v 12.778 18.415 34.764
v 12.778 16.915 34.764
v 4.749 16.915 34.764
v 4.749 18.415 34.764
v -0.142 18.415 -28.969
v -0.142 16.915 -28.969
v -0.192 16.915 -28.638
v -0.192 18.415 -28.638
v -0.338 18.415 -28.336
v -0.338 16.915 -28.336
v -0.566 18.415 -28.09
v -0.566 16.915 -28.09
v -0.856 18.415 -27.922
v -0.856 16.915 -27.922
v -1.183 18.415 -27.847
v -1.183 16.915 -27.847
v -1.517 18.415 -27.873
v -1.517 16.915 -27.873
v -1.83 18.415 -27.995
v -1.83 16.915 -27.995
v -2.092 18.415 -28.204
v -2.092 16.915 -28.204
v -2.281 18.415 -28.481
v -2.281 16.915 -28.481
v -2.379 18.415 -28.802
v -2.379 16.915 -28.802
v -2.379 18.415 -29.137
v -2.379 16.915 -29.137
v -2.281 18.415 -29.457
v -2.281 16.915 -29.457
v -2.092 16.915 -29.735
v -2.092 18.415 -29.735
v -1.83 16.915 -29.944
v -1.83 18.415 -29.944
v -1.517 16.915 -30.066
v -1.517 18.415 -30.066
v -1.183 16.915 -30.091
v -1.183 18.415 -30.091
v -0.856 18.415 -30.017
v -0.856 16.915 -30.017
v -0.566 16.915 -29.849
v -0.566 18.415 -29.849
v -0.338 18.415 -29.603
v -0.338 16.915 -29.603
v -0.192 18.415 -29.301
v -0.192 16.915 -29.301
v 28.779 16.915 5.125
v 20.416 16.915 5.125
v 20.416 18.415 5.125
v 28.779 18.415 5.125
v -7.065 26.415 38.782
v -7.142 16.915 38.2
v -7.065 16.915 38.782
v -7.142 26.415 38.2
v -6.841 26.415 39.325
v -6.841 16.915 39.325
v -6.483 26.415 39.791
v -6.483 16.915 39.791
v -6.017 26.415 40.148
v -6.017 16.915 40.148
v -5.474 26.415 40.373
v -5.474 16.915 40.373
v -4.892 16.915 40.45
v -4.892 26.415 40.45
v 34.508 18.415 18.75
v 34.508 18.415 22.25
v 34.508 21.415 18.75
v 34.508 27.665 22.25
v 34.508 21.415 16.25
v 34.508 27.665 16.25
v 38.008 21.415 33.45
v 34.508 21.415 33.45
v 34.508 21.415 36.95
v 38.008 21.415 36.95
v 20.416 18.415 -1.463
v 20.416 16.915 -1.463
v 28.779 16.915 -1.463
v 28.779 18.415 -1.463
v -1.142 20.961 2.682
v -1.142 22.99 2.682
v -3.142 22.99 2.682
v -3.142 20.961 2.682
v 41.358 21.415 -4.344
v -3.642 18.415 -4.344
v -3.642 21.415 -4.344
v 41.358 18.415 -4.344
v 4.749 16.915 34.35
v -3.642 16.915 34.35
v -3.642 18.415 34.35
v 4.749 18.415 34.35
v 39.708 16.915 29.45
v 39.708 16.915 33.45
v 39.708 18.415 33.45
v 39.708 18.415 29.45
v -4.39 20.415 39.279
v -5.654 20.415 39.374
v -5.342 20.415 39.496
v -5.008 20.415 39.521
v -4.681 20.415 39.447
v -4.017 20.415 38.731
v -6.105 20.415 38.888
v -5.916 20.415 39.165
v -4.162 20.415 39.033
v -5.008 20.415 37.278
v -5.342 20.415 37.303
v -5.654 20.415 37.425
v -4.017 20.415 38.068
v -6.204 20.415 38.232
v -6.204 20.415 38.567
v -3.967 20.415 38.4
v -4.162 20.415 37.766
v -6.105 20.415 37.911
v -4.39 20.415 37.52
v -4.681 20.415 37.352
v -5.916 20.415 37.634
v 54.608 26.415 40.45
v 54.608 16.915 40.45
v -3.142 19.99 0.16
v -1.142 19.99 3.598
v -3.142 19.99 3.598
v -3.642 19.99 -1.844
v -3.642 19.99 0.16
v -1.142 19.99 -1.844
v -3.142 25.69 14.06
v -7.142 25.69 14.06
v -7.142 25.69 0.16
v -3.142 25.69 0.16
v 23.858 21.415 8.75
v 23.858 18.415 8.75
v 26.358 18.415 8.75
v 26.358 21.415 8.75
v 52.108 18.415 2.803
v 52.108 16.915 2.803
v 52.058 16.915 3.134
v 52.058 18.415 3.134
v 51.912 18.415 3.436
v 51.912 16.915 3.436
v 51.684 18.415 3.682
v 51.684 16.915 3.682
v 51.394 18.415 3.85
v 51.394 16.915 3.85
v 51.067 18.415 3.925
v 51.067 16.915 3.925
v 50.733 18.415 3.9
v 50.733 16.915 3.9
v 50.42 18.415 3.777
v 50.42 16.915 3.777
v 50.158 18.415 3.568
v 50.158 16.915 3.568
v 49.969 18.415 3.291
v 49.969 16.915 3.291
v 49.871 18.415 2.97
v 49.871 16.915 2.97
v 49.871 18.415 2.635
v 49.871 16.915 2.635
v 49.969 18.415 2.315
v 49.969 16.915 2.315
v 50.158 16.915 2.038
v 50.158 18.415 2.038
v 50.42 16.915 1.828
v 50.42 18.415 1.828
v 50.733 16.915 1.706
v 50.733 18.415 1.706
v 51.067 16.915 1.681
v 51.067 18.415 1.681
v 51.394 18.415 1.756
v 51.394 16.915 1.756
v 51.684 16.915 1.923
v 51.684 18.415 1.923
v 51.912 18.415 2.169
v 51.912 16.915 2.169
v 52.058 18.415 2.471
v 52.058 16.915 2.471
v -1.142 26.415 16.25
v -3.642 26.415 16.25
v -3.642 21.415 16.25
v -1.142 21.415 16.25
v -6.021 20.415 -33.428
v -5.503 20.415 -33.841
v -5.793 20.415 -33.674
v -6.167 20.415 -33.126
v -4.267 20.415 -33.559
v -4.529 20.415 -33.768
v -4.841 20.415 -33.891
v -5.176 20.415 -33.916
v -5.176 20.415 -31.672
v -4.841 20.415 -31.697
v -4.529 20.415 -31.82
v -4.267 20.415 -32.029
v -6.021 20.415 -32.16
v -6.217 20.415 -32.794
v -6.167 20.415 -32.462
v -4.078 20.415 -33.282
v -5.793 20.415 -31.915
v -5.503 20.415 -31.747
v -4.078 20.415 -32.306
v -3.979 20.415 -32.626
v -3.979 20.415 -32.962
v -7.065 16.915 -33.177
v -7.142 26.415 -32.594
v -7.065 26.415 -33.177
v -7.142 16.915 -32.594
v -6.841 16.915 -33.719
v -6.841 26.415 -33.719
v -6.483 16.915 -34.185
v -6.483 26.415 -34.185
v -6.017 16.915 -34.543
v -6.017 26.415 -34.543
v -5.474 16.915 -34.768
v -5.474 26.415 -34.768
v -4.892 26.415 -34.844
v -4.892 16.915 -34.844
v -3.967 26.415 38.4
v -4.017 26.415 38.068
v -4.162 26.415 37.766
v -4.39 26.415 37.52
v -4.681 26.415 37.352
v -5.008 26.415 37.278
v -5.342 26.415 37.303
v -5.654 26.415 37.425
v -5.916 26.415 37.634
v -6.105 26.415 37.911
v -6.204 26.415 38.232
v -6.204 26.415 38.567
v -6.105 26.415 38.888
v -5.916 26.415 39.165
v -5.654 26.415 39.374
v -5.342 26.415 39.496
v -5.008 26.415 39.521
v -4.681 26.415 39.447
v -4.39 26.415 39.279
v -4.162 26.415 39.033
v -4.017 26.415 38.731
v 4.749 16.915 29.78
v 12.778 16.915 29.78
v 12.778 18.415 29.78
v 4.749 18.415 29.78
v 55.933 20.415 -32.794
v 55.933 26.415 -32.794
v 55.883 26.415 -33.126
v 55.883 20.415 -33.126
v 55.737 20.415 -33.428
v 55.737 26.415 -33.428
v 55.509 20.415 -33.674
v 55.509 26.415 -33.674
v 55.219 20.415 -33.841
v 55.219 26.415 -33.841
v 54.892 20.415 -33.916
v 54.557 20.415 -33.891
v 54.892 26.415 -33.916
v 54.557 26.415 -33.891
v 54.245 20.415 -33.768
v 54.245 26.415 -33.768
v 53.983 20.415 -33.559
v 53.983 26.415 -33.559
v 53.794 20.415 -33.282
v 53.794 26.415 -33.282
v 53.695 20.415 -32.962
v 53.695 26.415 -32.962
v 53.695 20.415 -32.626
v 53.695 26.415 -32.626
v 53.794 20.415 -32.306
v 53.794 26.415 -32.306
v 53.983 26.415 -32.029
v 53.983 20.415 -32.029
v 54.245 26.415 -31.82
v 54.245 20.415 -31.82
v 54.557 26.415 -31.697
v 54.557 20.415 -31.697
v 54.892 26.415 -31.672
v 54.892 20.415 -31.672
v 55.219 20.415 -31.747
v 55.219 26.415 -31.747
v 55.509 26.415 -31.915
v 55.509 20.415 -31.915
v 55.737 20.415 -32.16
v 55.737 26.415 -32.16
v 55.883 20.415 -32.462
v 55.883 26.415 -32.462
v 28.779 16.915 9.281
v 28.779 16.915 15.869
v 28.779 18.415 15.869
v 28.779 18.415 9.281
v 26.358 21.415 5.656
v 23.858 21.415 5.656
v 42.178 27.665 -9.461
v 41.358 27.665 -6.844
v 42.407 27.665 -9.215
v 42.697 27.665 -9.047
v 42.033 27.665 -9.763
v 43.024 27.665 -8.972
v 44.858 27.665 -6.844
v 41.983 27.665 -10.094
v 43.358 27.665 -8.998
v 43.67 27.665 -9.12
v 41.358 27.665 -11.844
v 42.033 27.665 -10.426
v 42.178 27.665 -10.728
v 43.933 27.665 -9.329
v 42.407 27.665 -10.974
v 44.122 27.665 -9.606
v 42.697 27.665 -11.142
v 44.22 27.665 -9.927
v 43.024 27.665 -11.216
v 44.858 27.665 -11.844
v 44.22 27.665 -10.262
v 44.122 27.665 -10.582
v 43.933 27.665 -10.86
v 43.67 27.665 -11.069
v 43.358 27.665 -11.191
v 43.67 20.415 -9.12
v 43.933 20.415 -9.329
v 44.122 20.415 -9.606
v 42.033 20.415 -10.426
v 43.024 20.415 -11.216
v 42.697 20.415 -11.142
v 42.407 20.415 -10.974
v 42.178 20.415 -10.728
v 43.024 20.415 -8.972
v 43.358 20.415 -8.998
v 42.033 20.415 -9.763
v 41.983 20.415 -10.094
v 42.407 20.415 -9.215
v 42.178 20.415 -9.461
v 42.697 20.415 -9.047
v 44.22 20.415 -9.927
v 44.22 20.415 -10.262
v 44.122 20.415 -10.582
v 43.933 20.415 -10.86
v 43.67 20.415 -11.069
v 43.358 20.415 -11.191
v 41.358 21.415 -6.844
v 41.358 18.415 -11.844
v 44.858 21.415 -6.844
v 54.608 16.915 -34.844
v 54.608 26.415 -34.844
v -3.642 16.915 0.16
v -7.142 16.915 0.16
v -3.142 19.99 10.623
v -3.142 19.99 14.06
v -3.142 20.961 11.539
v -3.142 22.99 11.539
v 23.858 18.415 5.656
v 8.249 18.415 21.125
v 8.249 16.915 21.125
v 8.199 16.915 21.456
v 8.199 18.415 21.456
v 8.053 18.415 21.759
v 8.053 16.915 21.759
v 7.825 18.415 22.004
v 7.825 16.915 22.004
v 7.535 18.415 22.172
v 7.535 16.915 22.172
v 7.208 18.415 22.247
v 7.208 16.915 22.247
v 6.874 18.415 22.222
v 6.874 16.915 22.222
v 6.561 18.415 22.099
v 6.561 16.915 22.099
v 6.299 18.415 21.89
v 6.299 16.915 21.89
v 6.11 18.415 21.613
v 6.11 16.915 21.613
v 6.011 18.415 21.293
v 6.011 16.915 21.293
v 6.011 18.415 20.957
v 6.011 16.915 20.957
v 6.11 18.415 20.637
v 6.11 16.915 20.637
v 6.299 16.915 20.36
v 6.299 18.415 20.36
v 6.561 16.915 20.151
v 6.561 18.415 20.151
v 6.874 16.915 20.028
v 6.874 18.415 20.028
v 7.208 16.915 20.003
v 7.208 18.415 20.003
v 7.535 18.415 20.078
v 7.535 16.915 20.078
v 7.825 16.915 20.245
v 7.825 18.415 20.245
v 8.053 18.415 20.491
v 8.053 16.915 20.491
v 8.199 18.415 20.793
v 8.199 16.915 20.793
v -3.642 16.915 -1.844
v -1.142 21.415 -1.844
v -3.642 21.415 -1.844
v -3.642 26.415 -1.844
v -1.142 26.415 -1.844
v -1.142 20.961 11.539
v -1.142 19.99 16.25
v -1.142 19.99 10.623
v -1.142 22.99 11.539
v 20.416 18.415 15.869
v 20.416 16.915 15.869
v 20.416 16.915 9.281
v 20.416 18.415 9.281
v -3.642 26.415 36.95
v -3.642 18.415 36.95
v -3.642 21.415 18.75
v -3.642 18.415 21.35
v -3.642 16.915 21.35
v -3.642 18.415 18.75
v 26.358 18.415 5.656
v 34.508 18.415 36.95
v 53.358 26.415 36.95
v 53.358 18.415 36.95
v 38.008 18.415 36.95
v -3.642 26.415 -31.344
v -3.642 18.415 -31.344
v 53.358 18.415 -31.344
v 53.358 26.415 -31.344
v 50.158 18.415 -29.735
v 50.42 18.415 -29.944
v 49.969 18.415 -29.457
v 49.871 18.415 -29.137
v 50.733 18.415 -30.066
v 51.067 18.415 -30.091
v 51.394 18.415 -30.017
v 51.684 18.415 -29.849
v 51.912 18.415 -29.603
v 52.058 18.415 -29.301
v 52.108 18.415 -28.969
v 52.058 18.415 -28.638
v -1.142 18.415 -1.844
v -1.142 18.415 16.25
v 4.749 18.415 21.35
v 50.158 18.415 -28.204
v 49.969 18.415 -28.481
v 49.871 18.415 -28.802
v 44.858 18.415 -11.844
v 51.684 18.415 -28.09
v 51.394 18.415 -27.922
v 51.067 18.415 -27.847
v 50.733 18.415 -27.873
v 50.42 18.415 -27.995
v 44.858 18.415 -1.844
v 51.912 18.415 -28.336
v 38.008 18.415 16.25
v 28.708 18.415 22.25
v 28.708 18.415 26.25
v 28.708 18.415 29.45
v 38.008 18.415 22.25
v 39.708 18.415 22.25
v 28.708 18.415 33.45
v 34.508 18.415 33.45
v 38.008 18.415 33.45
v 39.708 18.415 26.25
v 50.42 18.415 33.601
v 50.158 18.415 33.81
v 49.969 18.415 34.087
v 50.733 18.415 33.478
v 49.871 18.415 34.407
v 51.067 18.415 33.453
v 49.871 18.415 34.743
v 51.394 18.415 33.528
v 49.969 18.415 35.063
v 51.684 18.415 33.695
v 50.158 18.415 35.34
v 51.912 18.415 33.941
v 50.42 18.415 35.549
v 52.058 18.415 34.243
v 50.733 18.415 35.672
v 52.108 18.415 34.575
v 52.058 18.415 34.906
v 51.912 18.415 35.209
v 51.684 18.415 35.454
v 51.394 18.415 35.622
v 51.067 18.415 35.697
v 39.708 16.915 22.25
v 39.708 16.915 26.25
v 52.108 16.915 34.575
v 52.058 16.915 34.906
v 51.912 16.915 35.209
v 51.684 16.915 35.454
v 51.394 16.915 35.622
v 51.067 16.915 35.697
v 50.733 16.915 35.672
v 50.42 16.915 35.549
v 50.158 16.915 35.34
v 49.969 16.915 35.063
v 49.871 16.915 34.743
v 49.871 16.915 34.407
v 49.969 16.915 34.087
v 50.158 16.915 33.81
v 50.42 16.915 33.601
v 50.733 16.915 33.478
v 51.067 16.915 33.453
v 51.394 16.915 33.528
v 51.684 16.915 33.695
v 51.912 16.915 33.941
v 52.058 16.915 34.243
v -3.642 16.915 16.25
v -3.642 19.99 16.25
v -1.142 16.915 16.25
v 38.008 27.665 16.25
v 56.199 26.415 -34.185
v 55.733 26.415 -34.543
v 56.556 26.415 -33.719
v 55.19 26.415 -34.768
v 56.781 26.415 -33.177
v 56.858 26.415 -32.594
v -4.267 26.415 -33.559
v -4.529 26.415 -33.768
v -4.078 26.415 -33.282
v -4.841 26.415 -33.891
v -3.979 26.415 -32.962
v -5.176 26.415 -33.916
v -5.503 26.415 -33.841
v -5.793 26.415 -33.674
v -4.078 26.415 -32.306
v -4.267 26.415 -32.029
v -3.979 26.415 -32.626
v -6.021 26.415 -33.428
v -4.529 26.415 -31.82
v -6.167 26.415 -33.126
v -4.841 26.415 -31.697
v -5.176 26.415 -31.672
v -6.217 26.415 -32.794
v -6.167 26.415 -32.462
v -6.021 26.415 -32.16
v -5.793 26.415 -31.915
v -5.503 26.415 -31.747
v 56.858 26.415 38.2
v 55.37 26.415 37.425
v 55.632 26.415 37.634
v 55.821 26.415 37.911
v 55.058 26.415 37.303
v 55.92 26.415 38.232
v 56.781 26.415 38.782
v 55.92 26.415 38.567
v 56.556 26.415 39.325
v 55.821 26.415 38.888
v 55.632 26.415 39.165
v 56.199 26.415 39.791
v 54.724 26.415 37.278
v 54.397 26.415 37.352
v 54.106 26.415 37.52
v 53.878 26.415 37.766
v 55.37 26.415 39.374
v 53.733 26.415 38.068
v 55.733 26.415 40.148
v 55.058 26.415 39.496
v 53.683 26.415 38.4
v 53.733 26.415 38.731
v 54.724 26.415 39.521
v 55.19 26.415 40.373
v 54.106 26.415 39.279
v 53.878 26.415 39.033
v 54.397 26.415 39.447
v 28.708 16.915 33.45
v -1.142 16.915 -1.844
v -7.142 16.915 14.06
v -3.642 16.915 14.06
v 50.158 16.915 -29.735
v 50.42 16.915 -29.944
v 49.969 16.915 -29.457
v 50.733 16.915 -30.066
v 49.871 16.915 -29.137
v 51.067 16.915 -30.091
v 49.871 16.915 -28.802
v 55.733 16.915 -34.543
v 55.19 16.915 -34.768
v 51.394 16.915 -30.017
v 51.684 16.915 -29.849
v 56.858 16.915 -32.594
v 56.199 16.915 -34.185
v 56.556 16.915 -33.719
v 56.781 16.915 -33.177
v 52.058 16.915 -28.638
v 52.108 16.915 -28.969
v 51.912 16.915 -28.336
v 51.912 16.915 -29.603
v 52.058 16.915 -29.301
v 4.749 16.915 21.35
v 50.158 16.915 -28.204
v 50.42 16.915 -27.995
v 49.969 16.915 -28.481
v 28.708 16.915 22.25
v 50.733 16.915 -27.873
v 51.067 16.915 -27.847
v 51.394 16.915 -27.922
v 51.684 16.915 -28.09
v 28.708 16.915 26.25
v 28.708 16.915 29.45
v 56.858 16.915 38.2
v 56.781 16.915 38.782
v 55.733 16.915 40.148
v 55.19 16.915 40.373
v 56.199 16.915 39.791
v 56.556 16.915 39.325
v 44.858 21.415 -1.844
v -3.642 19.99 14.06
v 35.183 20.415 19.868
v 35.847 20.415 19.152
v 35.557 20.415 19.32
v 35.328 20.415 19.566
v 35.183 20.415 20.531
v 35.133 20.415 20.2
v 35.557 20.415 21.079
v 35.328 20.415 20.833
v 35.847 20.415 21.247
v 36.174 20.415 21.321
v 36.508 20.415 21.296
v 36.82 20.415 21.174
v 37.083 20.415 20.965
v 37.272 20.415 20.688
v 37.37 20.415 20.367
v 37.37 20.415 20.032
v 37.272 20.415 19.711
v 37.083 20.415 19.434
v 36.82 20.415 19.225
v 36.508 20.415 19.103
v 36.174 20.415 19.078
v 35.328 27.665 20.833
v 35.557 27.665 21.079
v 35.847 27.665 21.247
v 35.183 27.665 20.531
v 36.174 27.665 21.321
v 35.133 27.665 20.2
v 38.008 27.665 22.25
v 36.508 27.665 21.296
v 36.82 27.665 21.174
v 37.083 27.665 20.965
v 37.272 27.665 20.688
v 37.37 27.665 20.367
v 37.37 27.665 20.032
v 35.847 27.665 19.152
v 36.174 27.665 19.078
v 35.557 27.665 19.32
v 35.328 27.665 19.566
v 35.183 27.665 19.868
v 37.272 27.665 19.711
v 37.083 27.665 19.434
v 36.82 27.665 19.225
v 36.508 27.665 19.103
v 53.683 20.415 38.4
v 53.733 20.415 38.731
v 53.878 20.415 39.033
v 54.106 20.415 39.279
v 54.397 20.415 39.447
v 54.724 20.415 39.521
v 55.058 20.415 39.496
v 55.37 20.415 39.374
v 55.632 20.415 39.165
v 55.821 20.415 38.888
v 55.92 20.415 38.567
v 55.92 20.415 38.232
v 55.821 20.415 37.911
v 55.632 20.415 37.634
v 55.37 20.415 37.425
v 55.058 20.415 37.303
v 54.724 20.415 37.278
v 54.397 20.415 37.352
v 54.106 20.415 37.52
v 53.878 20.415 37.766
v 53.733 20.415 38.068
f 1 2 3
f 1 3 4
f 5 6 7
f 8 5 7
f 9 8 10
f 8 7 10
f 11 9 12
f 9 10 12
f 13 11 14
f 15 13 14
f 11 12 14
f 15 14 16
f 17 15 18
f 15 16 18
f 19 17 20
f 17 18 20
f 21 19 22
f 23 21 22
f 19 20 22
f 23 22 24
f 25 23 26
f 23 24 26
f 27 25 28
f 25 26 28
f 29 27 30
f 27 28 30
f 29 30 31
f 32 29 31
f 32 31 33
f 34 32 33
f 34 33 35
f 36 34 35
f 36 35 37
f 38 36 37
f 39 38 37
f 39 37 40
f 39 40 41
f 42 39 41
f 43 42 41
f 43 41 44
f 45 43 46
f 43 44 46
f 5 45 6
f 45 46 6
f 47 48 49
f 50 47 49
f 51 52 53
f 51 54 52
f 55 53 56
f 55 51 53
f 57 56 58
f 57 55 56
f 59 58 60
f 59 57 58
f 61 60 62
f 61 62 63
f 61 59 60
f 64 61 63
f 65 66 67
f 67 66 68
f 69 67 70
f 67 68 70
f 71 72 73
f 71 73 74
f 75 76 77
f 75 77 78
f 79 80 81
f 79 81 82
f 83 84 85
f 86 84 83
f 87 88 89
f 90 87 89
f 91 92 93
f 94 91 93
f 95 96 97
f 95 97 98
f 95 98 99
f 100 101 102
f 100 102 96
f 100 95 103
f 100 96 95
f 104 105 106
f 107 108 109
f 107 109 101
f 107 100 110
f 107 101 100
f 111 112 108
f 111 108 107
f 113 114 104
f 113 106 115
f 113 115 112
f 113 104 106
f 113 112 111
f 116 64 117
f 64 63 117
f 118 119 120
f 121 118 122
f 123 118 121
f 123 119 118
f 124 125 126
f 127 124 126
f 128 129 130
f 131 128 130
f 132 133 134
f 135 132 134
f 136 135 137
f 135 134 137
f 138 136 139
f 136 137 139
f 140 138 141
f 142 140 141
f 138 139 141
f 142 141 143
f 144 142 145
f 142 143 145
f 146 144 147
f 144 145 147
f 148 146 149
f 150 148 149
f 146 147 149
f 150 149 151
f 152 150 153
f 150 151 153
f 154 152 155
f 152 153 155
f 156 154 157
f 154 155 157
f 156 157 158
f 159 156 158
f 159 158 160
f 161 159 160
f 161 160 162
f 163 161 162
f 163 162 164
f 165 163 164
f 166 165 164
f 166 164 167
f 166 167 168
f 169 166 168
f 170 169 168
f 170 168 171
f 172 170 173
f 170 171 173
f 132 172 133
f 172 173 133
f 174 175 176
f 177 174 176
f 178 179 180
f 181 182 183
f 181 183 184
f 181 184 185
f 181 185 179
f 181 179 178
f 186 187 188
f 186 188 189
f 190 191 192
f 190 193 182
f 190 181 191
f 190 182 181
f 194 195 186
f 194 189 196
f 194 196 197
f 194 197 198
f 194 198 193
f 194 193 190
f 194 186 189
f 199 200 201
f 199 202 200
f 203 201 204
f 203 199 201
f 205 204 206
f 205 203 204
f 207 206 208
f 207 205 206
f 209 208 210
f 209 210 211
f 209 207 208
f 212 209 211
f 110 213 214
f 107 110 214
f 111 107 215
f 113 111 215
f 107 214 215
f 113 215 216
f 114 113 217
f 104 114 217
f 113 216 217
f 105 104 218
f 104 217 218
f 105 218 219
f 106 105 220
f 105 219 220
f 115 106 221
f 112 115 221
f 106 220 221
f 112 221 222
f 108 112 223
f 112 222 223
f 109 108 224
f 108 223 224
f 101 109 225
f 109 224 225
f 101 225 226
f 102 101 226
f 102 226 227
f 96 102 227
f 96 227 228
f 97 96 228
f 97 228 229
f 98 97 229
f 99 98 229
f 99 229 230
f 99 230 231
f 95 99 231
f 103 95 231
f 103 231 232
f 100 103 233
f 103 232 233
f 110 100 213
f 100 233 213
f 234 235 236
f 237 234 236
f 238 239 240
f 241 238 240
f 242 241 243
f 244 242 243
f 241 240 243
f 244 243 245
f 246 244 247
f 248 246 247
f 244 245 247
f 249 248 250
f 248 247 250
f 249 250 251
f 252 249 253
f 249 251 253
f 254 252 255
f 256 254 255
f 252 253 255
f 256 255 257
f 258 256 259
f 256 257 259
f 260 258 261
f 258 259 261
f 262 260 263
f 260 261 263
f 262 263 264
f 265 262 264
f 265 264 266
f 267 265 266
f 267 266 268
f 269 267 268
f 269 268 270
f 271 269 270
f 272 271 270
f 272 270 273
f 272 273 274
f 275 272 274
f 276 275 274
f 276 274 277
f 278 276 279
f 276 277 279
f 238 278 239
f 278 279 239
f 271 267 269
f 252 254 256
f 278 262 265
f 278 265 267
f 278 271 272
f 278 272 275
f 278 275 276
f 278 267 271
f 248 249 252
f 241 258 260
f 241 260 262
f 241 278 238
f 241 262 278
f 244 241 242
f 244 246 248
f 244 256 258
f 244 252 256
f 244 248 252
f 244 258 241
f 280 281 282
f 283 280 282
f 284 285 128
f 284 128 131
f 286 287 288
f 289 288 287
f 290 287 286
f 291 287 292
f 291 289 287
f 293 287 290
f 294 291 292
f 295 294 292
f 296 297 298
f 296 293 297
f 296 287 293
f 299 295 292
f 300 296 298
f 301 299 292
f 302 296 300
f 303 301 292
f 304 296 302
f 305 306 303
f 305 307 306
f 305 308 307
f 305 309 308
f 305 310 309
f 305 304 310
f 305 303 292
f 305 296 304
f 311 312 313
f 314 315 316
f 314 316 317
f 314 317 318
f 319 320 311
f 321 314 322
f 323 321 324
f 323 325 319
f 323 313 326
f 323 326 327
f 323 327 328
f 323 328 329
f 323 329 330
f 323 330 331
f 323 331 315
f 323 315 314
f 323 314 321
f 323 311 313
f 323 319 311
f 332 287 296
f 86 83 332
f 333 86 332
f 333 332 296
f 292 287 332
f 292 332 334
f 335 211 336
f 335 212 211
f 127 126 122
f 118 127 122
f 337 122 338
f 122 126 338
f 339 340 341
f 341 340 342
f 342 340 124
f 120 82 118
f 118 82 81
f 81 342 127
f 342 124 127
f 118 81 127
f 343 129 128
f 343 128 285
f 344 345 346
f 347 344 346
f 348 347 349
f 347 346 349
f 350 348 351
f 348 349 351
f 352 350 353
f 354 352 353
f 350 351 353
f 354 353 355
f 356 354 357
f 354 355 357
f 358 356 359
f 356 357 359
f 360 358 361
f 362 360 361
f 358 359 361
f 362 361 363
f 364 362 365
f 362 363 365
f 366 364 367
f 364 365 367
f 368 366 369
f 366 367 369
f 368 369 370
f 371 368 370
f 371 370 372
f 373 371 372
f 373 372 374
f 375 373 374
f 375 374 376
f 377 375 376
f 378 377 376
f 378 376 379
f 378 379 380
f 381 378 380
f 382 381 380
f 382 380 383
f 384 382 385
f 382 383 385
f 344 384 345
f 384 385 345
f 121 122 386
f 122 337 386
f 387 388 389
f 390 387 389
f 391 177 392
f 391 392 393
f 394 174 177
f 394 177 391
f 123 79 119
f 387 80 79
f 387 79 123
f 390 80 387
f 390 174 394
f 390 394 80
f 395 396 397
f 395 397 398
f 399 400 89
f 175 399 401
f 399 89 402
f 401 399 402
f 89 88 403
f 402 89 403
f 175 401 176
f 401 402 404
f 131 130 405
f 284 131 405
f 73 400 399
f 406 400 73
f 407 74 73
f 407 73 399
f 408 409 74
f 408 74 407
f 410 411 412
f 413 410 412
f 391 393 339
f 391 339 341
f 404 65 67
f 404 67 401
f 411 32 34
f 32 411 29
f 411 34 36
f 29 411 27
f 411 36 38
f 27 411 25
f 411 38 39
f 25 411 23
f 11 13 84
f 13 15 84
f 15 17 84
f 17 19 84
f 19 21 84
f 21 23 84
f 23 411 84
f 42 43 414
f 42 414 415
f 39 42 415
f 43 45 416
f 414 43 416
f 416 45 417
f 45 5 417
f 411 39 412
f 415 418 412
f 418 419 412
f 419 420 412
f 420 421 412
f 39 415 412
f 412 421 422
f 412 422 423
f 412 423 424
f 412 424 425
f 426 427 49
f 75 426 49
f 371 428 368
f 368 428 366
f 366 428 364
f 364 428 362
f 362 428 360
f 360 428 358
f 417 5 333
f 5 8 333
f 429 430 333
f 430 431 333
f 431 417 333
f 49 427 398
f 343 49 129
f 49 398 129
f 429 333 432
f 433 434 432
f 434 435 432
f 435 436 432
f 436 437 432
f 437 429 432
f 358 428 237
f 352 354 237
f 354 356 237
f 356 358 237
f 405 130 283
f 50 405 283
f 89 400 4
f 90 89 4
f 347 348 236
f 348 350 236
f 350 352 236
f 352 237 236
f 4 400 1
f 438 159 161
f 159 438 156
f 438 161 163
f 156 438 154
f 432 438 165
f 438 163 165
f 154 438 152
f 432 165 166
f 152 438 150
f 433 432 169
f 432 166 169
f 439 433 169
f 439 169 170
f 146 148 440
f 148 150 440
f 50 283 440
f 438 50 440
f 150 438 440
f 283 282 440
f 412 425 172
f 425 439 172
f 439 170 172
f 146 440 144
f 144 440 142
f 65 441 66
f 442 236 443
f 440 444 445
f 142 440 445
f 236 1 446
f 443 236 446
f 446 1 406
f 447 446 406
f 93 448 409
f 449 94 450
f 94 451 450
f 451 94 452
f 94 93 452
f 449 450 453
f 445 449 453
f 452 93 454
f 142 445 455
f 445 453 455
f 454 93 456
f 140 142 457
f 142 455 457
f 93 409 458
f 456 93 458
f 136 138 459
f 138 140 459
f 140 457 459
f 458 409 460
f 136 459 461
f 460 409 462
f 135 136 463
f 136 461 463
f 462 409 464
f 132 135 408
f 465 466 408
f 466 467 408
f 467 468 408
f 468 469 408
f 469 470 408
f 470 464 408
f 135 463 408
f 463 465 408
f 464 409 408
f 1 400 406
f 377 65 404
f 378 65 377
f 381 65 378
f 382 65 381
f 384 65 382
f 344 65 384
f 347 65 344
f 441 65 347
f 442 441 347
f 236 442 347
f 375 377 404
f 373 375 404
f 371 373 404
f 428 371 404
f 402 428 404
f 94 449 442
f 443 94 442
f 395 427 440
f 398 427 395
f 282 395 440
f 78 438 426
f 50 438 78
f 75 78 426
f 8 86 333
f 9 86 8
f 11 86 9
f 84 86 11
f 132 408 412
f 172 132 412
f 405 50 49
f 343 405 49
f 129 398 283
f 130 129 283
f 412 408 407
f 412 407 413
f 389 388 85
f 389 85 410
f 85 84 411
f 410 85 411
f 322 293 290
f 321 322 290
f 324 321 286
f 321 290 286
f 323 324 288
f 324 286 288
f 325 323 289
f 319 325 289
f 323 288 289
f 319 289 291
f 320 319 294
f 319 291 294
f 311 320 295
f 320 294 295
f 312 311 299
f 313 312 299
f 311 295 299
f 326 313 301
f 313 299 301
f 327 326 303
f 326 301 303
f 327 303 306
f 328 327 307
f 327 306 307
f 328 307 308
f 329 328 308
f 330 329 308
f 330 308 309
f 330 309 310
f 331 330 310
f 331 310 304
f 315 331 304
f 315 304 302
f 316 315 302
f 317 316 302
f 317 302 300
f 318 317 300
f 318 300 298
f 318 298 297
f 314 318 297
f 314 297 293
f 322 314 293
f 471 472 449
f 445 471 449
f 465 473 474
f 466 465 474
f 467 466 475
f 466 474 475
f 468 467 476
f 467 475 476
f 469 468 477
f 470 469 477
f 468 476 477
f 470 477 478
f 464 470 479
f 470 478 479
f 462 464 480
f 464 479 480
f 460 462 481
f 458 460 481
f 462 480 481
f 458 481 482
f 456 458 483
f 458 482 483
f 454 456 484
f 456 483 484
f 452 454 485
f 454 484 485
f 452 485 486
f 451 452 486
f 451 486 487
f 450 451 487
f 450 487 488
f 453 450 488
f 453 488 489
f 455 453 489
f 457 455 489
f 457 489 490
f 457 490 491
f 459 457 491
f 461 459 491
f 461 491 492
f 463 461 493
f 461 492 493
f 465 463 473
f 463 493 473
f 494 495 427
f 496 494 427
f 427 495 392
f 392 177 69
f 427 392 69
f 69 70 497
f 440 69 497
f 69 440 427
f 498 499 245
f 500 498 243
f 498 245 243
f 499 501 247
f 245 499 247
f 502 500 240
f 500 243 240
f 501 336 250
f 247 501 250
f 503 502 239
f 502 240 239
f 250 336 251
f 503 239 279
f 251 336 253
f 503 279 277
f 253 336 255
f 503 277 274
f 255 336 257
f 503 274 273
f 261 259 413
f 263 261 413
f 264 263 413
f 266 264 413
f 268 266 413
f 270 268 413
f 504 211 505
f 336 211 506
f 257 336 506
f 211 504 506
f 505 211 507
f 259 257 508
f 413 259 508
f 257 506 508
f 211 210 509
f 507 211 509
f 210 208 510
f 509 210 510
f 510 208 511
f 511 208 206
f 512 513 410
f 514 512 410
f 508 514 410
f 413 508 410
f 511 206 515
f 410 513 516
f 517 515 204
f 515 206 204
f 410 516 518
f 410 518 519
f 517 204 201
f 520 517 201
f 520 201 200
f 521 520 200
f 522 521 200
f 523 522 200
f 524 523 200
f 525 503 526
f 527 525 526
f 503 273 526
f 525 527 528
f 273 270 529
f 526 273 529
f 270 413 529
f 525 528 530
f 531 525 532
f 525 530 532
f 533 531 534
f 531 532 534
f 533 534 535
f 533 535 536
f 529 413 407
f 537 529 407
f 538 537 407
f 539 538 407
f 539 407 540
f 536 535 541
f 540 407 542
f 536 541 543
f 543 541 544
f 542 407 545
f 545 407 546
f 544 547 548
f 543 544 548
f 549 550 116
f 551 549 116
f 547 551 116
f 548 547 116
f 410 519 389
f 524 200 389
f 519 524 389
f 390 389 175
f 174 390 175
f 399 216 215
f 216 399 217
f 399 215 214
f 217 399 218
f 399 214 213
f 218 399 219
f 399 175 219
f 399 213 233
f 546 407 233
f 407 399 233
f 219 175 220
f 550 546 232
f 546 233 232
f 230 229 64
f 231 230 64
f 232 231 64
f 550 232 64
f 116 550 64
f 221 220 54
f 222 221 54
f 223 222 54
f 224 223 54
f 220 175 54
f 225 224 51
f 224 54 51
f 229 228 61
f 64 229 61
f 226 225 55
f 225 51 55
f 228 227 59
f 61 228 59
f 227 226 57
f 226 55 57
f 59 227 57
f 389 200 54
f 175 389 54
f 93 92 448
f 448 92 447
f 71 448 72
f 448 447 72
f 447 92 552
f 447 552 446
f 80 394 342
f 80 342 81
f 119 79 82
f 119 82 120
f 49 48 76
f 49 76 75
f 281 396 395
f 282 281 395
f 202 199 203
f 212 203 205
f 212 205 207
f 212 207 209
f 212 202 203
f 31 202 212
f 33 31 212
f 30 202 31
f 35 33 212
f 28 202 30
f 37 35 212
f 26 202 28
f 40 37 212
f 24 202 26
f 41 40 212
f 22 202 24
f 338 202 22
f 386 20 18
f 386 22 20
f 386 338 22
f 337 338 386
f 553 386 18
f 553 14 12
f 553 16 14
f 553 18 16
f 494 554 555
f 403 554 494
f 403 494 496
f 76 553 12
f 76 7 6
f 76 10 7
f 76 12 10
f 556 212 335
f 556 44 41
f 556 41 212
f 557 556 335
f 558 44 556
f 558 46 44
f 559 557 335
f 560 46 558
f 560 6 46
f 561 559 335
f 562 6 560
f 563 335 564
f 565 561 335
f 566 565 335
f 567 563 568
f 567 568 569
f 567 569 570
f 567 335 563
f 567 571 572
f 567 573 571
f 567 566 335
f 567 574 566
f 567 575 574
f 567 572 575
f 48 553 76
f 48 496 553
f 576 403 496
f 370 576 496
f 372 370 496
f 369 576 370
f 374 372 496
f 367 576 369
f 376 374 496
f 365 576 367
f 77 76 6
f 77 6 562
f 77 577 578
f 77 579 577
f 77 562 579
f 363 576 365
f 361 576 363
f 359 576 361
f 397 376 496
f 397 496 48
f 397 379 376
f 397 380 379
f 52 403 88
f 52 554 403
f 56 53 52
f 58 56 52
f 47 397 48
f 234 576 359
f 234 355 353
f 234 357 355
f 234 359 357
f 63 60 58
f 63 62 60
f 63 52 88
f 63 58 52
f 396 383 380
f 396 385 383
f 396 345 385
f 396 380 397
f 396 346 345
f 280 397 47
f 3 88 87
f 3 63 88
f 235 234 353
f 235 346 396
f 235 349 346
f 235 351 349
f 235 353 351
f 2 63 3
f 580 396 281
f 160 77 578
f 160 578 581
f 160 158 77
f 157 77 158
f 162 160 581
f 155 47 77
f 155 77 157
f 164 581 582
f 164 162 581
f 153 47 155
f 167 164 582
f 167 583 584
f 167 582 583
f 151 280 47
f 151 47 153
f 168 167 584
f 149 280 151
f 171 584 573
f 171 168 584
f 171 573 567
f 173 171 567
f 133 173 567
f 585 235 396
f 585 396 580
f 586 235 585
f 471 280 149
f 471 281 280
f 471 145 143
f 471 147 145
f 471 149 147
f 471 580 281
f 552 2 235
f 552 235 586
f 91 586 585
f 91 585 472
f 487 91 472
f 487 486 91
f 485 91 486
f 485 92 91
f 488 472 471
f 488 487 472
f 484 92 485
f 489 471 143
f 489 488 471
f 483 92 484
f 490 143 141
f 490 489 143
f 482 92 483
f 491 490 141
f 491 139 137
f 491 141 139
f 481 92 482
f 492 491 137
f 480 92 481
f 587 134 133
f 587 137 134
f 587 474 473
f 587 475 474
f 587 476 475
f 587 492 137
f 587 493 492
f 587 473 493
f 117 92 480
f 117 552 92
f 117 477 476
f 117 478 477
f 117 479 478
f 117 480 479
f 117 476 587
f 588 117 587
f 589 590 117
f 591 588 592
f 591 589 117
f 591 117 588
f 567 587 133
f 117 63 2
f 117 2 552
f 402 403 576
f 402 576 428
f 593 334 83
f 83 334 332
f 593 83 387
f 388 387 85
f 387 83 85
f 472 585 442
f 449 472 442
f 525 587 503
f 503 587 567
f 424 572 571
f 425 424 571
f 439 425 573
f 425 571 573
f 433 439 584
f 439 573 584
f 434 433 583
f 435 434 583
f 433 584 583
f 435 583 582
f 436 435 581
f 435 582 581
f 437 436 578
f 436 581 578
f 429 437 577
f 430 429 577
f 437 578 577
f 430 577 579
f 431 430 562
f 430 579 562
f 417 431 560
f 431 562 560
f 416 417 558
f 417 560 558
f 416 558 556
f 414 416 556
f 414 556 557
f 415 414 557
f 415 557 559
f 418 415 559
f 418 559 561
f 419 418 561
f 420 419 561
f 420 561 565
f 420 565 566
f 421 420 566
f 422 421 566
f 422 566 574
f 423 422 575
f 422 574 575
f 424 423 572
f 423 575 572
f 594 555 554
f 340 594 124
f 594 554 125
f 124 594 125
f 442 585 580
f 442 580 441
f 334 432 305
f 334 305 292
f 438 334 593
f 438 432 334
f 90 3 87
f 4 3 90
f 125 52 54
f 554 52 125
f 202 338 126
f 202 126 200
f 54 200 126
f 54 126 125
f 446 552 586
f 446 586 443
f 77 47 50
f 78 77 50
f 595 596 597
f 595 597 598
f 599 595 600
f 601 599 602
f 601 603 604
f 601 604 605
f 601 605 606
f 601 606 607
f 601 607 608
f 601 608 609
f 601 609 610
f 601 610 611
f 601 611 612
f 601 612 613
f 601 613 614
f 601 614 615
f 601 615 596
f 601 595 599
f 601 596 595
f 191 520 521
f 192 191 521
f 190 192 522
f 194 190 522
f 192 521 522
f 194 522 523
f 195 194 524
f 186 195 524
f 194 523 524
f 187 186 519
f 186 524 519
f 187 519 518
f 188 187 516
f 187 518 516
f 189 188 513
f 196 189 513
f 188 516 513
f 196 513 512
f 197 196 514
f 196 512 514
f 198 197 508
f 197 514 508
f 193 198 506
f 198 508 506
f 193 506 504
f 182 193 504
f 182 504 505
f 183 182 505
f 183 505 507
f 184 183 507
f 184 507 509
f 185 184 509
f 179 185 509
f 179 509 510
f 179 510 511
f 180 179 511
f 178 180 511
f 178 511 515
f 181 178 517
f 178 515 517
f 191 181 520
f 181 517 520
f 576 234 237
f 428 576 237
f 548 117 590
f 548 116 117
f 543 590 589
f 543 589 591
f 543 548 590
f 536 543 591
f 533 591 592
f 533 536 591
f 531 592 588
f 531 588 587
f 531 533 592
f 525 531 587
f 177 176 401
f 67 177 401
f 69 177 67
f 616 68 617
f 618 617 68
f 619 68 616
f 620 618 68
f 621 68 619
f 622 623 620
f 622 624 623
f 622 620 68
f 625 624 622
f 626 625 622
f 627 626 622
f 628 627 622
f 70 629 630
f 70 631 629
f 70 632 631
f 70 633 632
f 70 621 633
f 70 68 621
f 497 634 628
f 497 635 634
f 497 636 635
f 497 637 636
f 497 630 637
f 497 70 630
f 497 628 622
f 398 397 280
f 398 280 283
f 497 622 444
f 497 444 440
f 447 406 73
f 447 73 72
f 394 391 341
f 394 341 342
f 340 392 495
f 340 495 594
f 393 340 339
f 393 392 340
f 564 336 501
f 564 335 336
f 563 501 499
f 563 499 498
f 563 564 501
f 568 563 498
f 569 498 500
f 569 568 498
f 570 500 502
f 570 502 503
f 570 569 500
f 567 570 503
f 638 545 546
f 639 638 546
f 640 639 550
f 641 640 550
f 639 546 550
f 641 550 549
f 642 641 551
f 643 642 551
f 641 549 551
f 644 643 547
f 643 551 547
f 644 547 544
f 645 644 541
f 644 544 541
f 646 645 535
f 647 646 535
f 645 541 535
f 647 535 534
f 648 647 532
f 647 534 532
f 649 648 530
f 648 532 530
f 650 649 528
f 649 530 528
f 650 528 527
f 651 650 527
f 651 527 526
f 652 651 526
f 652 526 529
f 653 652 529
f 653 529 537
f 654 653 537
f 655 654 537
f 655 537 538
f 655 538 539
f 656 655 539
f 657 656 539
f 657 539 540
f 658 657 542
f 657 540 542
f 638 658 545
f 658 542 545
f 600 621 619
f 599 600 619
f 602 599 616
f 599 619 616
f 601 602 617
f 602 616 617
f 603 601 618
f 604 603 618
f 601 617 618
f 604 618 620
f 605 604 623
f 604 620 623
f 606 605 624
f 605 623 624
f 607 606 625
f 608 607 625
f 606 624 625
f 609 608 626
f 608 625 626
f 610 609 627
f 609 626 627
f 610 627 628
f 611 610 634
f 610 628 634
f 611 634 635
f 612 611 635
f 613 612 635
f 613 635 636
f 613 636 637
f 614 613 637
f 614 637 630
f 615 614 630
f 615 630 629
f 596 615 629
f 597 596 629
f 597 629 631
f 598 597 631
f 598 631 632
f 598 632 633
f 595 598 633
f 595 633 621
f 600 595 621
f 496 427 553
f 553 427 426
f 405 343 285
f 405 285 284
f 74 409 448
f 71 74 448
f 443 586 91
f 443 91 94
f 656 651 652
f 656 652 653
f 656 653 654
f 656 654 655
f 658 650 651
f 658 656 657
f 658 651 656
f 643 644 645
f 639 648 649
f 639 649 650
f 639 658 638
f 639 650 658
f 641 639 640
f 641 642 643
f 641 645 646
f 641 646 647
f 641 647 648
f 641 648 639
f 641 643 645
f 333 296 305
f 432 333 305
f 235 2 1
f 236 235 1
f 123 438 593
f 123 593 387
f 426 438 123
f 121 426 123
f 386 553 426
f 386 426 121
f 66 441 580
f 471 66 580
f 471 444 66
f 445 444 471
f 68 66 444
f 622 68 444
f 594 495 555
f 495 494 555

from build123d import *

# Parameters (mm, degrees)
SKETCH2_W              = 64
SKETCH2_H              = 75.2942
BASE_DEPTH             = 1.5
SKETCH6_W              = 64
SKETCH6_H              = 75.2942
SKETCH6_W_2            = 57
SKETCH6_H_2            = 68.2942
OUTSIDE_WALLS_DEPTH    = 8
SKETCH3_W              = 44.5
SKETCH3_H              = 2.5
SKETCH3_W_2            = 37.65
DIVIDER_WALLS_DEPTH    = 3
USB_START              = 0.160298289
USB_HOLE_DEPTH         = 13.899833209
SKETCH10_W             = 3.5
SKETCH10_H             = 3.5
BATT_MT3608_STOP_DEPTH = 3
TP4056_START           = 18.414945084
TP4056_STOP_OUTLINE_W  = 2.5
TP4056_STOP_OUTLINE_H  = 3.0942
TP4056_STOP_DEPTH      = 3
WIRE_START             = 20.416440404
WIRE_HOLES_OUTLINE_W   = 1.5
WIRE_HOLES_OUTLINE_H   = 6.588
WIRE_HOLES_DEPTH       = 8.3622
WIRE_START_2           = -3.642059596
WIRE_HOLES_2_OUTLINE_W = 1.5
WIRE_HOLES_2_OUTLINE_H = 13
WIRE_HOLES_2_DEPTH     = 8.390953786
WIRE_START_3           = 28.707940404
WIRE_HOLES_3_OUTLINE_W = 1.5
WIRE_HOLES_3_OUTLINE_H = 4
WIRE_HOLES_3_DEPTH     = 11
WIRE_START_4           = 4.74889419
WIRE_HOLES_4_OUTLINE_W = 1.5
WIRE_HOLES_4_OUTLINE_H = 4.98430333
WIRE_HOLES_4_DEPTH     = 8.028885191
USB_HOOD_DEPTH         = 2.5
USB_BACKING_DEPTH      = 2
SKETCH19_W             = 2.5
SKETCH19_H             = 18.0942
CUT_EXTRUDE2_DEPTH     = 1.5
SKETCH16_R             = 1.125
SCREW_HOLES_DEPTH      = 6
FILLET1_R              = 2.25
BOSS_EXTRUDE3_START    = 6.25
SKETCH17_W             = 3.5
SKETCH17_H             = 6
SKETCH17_R             = 1.125
SKETCH17_H_2           = 5
BOSS_EXTRUDE3_DEPTH    = 6.25
SKETCH18_R             = 1.125
CUT_EXTRUDE1_DEPTH     = 1.5


# Read off the part's stored shape, not the designer's step: USB Hole, TP4056 Stop, Wire Holes
with BuildPart() as part:
    # Sketch2 → Base (new body)
    with BuildSketch(Plane.XZ.offset(-18.414945084)):
        with Locations((24.857940404, 2.802763775)):
            Rectangle(SKETCH2_W, SKETCH2_H)
    extrude(amount=BASE_DEPTH)

    # Sketch6 → Outside Walls (add)
    with BuildSketch(Plane(origin=(0, 18.414945084, 0), x_dir=(1, 0, 0), z_dir=(0, 1, 0))):
        with Locations((24.857940404, -2.802763775)):
            Rectangle(SKETCH6_W, SKETCH6_H)
        with Locations((24.857940404, -2.802763775)):
            Rectangle(SKETCH6_W_2, SKETCH6_H_2, mode=Mode.SUBTRACT)
    extrude(amount=OUTSIDE_WALLS_DEPTH)

    # Sketch3 → Divider Walls (add)
    with BuildSketch(Plane(origin=(0, 18.414945084, 0), x_dir=(1, 0, 0), z_dir=(0, 1, 0))):
        with Locations((18.607940404, 3.094336225)):
            Rectangle(SKETCH3_W, SKETCH3_H)
        with Locations((15.182940404, -17.499863775)):
            Rectangle(SKETCH3_W_2, SKETCH3_H)
    extrude(amount=DIVIDER_WALLS_DEPTH)

    # USB Hole outline → USB Hole (cut)
    with BuildSketch(Plane.XY.offset(USB_START)):
        Polygon((-3.142059596, 16.914945084), (-3.142059596, 18.414945084), (-3.642059596, 18.414945084), (-3.642059596, 25.689688961), (-7.142059596, 25.689688961), (-7.142059596, 16.914945084), align=None)
    extrude(amount=USB_HOLE_DEPTH, mode=Mode.SUBTRACT)

    # Sketch10 → Batt & MT3608 Stop (add)
    with BuildSketch(Plane(origin=(0, 18.414945084, 0), x_dir=(1, 0, 0), z_dir=(0, 1, 0))):
        Polygon((44.857940404, 1.844336225), (40.857940404, 1.844336225), (40.857940404, 4.344336225), (41.357940404, 4.344336225), (41.357940404, 11.844336225), (44.857940404, 11.844336225), align=None)
        Polygon((34.507940404, -18.749863775), (34.007940404, -18.749863775), (34.007940404, -16.249863775), (38.007940404, -16.249863775), (38.007940404, -22.249863775), (34.507940404, -22.249863775), align=None)
        with Locations((36.257940404, -35.199863775)):
            Rectangle(SKETCH10_W, SKETCH10_H)
    extrude(amount=BATT_MT3608_STOP_DEPTH)

    # TP4056 Stop outline → TP4056 Stop (add)
    with BuildSketch(Plane(origin=(0, 0, 0), x_dir=(1, 0, 0), z_dir=(0, 1, 0)).offset(TP4056_START)):
        with Locations((25.107940404, -7.202763775)):
            Rectangle(TP4056_STOP_OUTLINE_W, TP4056_STOP_OUTLINE_H)
    extrude(amount=TP4056_STOP_DEPTH)

    # Wire Holes outline → Wire Holes (cut)
    with BuildSketch(Plane.YZ.offset(WIRE_START)):
        with Locations((17.664945084, 12.574863775)):
            Rectangle(WIRE_HOLES_OUTLINE_W, WIRE_HOLES_OUTLINE_H)
        with Locations((17.664945084, 1.830663775)):
            Rectangle(WIRE_HOLES_OUTLINE_W, WIRE_HOLES_OUTLINE_H)
    extrude(amount=WIRE_HOLES_DEPTH, mode=Mode.SUBTRACT)

    # Wire Holes 2 outline → Wire Holes 2 (cut)
    with BuildSketch(Plane.YZ.offset(WIRE_START_2)):
        with Locations((17.664945084, 27.849863775)):
            Rectangle(WIRE_HOLES_2_OUTLINE_W, WIRE_HOLES_2_OUTLINE_H)
    extrude(amount=WIRE_HOLES_2_DEPTH, mode=Mode.SUBTRACT)

    # Wire Holes 3 outline → Wire Holes 3 (cut)
    with BuildSketch(Plane.YZ.offset(WIRE_START_3)):
        with Locations((17.664945084, 24.249863775)):
            Rectangle(WIRE_HOLES_3_OUTLINE_W, WIRE_HOLES_3_OUTLINE_H)
        with Locations((17.664945084, 31.449863775)):
            Rectangle(WIRE_HOLES_3_OUTLINE_W, WIRE_HOLES_3_OUTLINE_H)
    extrude(amount=WIRE_HOLES_3_DEPTH, mode=Mode.SUBTRACT)

    # Wire Holes 4 outline → Wire Holes 4 (cut)
    with BuildSketch(Plane.YZ.offset(WIRE_START_4)):
        with Locations((17.664945084, 32.272120623)):
            Rectangle(WIRE_HOLES_4_OUTLINE_W, WIRE_HOLES_4_OUTLINE_H)
    extrude(amount=WIRE_HOLES_4_DEPTH, mode=Mode.SUBTRACT)

    # Sketch14 → USB Hood (add)
    with BuildSketch(Plane(origin=(-3.642059596, 0, 0), x_dir=(0, 0, -1), z_dir=(1, 0, 0))):
        Polygon((-14.060131498, 19.989745084), (-14.060131498, 25.689688961), (-0.160298289, 25.689688961), (-0.160298289, 19.989745084), (1.844336225, 19.989745084), (1.844336225, 26.414945084), (-16.249863775, 26.414945084), (-16.249863775, 19.989745084), align=None)
    extrude(amount=USB_HOOD_DEPTH)

    # Sketch15 → USB Backing (add)
    with BuildSketch(Plane(origin=(-1.142059596, 0, 0), x_dir=(0, 0, -1), z_dir=(1, 0, 0))):
        Polygon((-2.681738903, 22.989735785), (-2.681738903, 20.961450556), (-3.59783083, 19.989745084), (-0.160298289, 19.989745084), (-0.160298289, 25.689688961), (-14.060131498, 25.689688961), (-14.060131498, 19.989745084), (-10.622685302, 19.989745084), (-11.538656584, 20.961320912), (-11.538656584, 22.989735785), align=None)
    extrude(amount=-USB_BACKING_DEPTH)

    # Sketch19 → Cut-Extrude2 (cut)
    with BuildSketch(Plane(origin=(0, 18.414945084, 0), x_dir=(1, 0, 0), z_dir=(0, 1, 0))):
        with Locations((-2.392059596, -7.202763775)):
            Rectangle(SKETCH19_W, SKETCH19_H)
    extrude(amount=-CUT_EXTRUDE2_DEPTH, mode=Mode.SUBTRACT)

    # Sketch16 → Screw Holes (cut)
    with BuildSketch(Plane(origin=(0, 26.414945084, 0), x_dir=(1, 0, 0), z_dir=(0, 1, 0))):
        with Locations(Location((-5.091807064, 32.794083694, 0), (0, 0, 180))):
            Circle(SKETCH16_R)
        with Locations((54.807687872, 32.794083694)):
            Circle(SKETCH16_R)
        with Locations((-5.091807064, -38.399611243)):
            Circle(SKETCH16_R)
        with Locations(Location((54.807687872, -38.399611243, 0), (0, 0, 180))):
            Circle(SKETCH16_R)
        with Locations(Location((43.107940404, 10.094336225, 0), (0, 0, 180))):
            Circle(SKETCH16_R)
        with Locations(Location((36.257940404, -20.199611243, 0), (0, 0, 180))):
            Circle(SKETCH16_R)
    extrude(amount=-SCREW_HOLES_DEPTH, mode=Mode.SUBTRACT)

    # Fillet1
    fillet1_edges = [part.edges().sort_by_distance(p)[0] for p in [
        (-7.142059596, 21.664945084, 40.449863775),
        (-7.142059596, 21.664945084, -34.844336225),
        (56.857940404, 21.664945084, -34.844336225),
        (56.857940404, 21.664945084, 40.449863775),
    ]]
    fillet(fillet1_edges, radius=FILLET1_R)

    # Sketch17 → Boss-Extrude3 (add)
    # profile 1 of 2: a face of its own
    with BuildSketch(Plane(origin=(0, 21.414945084, 0), x_dir=(1, 0, 0), z_dir=(0, 1, 0)).offset(BOSS_EXTRUDE3_START)):
        with Locations((36.257940404, -19.249863775)):
            Rectangle(SKETCH17_W, SKETCH17_H)
        with Locations(Location((36.257940404, -20.199611243, 0), (0, 0, 180))):
            Circle(SKETCH17_R, mode=Mode.SUBTRACT)
    # profile 2 of 2: a face of its own
    with BuildSketch(Plane(origin=(0, 21.414945084, 0), x_dir=(1, 0, 0), z_dir=(0, 1, 0)).offset(BOSS_EXTRUDE3_START)):
        with Locations((43.107940404, 9.344336225)):
            Rectangle(SKETCH17_W, SKETCH17_H_2)
        with Locations(Location((43.107940404, 10.094336225, 0), (0, 0, 180))):
            Circle(SKETCH17_R, mode=Mode.SUBTRACT)
    extrude(amount=-BOSS_EXTRUDE3_DEPTH)

    # Sketch18 → Cut-Extrude1 (cut)
    with BuildSketch(Plane.XZ.offset(-16.914945084)):
        with Locations((50.982940404, 34.574863775)):
            Circle(SKETCH18_R)
        with Locations((50.982940404, 2.802763775)):
            Circle(SKETCH18_R)
        with Locations((50.982940404, -28.969336225)):
            Circle(SKETCH18_R)
        with Locations((-1.267059596, -28.969336225)):
            Circle(SKETCH18_R)
        with Locations((7.12389419, 21.124863775)):
            Circle(SKETCH18_R)
    extrude(amount=-CUT_EXTRUDE1_DEPTH, mode=Mode.SUBTRACT)


solid = part.part
